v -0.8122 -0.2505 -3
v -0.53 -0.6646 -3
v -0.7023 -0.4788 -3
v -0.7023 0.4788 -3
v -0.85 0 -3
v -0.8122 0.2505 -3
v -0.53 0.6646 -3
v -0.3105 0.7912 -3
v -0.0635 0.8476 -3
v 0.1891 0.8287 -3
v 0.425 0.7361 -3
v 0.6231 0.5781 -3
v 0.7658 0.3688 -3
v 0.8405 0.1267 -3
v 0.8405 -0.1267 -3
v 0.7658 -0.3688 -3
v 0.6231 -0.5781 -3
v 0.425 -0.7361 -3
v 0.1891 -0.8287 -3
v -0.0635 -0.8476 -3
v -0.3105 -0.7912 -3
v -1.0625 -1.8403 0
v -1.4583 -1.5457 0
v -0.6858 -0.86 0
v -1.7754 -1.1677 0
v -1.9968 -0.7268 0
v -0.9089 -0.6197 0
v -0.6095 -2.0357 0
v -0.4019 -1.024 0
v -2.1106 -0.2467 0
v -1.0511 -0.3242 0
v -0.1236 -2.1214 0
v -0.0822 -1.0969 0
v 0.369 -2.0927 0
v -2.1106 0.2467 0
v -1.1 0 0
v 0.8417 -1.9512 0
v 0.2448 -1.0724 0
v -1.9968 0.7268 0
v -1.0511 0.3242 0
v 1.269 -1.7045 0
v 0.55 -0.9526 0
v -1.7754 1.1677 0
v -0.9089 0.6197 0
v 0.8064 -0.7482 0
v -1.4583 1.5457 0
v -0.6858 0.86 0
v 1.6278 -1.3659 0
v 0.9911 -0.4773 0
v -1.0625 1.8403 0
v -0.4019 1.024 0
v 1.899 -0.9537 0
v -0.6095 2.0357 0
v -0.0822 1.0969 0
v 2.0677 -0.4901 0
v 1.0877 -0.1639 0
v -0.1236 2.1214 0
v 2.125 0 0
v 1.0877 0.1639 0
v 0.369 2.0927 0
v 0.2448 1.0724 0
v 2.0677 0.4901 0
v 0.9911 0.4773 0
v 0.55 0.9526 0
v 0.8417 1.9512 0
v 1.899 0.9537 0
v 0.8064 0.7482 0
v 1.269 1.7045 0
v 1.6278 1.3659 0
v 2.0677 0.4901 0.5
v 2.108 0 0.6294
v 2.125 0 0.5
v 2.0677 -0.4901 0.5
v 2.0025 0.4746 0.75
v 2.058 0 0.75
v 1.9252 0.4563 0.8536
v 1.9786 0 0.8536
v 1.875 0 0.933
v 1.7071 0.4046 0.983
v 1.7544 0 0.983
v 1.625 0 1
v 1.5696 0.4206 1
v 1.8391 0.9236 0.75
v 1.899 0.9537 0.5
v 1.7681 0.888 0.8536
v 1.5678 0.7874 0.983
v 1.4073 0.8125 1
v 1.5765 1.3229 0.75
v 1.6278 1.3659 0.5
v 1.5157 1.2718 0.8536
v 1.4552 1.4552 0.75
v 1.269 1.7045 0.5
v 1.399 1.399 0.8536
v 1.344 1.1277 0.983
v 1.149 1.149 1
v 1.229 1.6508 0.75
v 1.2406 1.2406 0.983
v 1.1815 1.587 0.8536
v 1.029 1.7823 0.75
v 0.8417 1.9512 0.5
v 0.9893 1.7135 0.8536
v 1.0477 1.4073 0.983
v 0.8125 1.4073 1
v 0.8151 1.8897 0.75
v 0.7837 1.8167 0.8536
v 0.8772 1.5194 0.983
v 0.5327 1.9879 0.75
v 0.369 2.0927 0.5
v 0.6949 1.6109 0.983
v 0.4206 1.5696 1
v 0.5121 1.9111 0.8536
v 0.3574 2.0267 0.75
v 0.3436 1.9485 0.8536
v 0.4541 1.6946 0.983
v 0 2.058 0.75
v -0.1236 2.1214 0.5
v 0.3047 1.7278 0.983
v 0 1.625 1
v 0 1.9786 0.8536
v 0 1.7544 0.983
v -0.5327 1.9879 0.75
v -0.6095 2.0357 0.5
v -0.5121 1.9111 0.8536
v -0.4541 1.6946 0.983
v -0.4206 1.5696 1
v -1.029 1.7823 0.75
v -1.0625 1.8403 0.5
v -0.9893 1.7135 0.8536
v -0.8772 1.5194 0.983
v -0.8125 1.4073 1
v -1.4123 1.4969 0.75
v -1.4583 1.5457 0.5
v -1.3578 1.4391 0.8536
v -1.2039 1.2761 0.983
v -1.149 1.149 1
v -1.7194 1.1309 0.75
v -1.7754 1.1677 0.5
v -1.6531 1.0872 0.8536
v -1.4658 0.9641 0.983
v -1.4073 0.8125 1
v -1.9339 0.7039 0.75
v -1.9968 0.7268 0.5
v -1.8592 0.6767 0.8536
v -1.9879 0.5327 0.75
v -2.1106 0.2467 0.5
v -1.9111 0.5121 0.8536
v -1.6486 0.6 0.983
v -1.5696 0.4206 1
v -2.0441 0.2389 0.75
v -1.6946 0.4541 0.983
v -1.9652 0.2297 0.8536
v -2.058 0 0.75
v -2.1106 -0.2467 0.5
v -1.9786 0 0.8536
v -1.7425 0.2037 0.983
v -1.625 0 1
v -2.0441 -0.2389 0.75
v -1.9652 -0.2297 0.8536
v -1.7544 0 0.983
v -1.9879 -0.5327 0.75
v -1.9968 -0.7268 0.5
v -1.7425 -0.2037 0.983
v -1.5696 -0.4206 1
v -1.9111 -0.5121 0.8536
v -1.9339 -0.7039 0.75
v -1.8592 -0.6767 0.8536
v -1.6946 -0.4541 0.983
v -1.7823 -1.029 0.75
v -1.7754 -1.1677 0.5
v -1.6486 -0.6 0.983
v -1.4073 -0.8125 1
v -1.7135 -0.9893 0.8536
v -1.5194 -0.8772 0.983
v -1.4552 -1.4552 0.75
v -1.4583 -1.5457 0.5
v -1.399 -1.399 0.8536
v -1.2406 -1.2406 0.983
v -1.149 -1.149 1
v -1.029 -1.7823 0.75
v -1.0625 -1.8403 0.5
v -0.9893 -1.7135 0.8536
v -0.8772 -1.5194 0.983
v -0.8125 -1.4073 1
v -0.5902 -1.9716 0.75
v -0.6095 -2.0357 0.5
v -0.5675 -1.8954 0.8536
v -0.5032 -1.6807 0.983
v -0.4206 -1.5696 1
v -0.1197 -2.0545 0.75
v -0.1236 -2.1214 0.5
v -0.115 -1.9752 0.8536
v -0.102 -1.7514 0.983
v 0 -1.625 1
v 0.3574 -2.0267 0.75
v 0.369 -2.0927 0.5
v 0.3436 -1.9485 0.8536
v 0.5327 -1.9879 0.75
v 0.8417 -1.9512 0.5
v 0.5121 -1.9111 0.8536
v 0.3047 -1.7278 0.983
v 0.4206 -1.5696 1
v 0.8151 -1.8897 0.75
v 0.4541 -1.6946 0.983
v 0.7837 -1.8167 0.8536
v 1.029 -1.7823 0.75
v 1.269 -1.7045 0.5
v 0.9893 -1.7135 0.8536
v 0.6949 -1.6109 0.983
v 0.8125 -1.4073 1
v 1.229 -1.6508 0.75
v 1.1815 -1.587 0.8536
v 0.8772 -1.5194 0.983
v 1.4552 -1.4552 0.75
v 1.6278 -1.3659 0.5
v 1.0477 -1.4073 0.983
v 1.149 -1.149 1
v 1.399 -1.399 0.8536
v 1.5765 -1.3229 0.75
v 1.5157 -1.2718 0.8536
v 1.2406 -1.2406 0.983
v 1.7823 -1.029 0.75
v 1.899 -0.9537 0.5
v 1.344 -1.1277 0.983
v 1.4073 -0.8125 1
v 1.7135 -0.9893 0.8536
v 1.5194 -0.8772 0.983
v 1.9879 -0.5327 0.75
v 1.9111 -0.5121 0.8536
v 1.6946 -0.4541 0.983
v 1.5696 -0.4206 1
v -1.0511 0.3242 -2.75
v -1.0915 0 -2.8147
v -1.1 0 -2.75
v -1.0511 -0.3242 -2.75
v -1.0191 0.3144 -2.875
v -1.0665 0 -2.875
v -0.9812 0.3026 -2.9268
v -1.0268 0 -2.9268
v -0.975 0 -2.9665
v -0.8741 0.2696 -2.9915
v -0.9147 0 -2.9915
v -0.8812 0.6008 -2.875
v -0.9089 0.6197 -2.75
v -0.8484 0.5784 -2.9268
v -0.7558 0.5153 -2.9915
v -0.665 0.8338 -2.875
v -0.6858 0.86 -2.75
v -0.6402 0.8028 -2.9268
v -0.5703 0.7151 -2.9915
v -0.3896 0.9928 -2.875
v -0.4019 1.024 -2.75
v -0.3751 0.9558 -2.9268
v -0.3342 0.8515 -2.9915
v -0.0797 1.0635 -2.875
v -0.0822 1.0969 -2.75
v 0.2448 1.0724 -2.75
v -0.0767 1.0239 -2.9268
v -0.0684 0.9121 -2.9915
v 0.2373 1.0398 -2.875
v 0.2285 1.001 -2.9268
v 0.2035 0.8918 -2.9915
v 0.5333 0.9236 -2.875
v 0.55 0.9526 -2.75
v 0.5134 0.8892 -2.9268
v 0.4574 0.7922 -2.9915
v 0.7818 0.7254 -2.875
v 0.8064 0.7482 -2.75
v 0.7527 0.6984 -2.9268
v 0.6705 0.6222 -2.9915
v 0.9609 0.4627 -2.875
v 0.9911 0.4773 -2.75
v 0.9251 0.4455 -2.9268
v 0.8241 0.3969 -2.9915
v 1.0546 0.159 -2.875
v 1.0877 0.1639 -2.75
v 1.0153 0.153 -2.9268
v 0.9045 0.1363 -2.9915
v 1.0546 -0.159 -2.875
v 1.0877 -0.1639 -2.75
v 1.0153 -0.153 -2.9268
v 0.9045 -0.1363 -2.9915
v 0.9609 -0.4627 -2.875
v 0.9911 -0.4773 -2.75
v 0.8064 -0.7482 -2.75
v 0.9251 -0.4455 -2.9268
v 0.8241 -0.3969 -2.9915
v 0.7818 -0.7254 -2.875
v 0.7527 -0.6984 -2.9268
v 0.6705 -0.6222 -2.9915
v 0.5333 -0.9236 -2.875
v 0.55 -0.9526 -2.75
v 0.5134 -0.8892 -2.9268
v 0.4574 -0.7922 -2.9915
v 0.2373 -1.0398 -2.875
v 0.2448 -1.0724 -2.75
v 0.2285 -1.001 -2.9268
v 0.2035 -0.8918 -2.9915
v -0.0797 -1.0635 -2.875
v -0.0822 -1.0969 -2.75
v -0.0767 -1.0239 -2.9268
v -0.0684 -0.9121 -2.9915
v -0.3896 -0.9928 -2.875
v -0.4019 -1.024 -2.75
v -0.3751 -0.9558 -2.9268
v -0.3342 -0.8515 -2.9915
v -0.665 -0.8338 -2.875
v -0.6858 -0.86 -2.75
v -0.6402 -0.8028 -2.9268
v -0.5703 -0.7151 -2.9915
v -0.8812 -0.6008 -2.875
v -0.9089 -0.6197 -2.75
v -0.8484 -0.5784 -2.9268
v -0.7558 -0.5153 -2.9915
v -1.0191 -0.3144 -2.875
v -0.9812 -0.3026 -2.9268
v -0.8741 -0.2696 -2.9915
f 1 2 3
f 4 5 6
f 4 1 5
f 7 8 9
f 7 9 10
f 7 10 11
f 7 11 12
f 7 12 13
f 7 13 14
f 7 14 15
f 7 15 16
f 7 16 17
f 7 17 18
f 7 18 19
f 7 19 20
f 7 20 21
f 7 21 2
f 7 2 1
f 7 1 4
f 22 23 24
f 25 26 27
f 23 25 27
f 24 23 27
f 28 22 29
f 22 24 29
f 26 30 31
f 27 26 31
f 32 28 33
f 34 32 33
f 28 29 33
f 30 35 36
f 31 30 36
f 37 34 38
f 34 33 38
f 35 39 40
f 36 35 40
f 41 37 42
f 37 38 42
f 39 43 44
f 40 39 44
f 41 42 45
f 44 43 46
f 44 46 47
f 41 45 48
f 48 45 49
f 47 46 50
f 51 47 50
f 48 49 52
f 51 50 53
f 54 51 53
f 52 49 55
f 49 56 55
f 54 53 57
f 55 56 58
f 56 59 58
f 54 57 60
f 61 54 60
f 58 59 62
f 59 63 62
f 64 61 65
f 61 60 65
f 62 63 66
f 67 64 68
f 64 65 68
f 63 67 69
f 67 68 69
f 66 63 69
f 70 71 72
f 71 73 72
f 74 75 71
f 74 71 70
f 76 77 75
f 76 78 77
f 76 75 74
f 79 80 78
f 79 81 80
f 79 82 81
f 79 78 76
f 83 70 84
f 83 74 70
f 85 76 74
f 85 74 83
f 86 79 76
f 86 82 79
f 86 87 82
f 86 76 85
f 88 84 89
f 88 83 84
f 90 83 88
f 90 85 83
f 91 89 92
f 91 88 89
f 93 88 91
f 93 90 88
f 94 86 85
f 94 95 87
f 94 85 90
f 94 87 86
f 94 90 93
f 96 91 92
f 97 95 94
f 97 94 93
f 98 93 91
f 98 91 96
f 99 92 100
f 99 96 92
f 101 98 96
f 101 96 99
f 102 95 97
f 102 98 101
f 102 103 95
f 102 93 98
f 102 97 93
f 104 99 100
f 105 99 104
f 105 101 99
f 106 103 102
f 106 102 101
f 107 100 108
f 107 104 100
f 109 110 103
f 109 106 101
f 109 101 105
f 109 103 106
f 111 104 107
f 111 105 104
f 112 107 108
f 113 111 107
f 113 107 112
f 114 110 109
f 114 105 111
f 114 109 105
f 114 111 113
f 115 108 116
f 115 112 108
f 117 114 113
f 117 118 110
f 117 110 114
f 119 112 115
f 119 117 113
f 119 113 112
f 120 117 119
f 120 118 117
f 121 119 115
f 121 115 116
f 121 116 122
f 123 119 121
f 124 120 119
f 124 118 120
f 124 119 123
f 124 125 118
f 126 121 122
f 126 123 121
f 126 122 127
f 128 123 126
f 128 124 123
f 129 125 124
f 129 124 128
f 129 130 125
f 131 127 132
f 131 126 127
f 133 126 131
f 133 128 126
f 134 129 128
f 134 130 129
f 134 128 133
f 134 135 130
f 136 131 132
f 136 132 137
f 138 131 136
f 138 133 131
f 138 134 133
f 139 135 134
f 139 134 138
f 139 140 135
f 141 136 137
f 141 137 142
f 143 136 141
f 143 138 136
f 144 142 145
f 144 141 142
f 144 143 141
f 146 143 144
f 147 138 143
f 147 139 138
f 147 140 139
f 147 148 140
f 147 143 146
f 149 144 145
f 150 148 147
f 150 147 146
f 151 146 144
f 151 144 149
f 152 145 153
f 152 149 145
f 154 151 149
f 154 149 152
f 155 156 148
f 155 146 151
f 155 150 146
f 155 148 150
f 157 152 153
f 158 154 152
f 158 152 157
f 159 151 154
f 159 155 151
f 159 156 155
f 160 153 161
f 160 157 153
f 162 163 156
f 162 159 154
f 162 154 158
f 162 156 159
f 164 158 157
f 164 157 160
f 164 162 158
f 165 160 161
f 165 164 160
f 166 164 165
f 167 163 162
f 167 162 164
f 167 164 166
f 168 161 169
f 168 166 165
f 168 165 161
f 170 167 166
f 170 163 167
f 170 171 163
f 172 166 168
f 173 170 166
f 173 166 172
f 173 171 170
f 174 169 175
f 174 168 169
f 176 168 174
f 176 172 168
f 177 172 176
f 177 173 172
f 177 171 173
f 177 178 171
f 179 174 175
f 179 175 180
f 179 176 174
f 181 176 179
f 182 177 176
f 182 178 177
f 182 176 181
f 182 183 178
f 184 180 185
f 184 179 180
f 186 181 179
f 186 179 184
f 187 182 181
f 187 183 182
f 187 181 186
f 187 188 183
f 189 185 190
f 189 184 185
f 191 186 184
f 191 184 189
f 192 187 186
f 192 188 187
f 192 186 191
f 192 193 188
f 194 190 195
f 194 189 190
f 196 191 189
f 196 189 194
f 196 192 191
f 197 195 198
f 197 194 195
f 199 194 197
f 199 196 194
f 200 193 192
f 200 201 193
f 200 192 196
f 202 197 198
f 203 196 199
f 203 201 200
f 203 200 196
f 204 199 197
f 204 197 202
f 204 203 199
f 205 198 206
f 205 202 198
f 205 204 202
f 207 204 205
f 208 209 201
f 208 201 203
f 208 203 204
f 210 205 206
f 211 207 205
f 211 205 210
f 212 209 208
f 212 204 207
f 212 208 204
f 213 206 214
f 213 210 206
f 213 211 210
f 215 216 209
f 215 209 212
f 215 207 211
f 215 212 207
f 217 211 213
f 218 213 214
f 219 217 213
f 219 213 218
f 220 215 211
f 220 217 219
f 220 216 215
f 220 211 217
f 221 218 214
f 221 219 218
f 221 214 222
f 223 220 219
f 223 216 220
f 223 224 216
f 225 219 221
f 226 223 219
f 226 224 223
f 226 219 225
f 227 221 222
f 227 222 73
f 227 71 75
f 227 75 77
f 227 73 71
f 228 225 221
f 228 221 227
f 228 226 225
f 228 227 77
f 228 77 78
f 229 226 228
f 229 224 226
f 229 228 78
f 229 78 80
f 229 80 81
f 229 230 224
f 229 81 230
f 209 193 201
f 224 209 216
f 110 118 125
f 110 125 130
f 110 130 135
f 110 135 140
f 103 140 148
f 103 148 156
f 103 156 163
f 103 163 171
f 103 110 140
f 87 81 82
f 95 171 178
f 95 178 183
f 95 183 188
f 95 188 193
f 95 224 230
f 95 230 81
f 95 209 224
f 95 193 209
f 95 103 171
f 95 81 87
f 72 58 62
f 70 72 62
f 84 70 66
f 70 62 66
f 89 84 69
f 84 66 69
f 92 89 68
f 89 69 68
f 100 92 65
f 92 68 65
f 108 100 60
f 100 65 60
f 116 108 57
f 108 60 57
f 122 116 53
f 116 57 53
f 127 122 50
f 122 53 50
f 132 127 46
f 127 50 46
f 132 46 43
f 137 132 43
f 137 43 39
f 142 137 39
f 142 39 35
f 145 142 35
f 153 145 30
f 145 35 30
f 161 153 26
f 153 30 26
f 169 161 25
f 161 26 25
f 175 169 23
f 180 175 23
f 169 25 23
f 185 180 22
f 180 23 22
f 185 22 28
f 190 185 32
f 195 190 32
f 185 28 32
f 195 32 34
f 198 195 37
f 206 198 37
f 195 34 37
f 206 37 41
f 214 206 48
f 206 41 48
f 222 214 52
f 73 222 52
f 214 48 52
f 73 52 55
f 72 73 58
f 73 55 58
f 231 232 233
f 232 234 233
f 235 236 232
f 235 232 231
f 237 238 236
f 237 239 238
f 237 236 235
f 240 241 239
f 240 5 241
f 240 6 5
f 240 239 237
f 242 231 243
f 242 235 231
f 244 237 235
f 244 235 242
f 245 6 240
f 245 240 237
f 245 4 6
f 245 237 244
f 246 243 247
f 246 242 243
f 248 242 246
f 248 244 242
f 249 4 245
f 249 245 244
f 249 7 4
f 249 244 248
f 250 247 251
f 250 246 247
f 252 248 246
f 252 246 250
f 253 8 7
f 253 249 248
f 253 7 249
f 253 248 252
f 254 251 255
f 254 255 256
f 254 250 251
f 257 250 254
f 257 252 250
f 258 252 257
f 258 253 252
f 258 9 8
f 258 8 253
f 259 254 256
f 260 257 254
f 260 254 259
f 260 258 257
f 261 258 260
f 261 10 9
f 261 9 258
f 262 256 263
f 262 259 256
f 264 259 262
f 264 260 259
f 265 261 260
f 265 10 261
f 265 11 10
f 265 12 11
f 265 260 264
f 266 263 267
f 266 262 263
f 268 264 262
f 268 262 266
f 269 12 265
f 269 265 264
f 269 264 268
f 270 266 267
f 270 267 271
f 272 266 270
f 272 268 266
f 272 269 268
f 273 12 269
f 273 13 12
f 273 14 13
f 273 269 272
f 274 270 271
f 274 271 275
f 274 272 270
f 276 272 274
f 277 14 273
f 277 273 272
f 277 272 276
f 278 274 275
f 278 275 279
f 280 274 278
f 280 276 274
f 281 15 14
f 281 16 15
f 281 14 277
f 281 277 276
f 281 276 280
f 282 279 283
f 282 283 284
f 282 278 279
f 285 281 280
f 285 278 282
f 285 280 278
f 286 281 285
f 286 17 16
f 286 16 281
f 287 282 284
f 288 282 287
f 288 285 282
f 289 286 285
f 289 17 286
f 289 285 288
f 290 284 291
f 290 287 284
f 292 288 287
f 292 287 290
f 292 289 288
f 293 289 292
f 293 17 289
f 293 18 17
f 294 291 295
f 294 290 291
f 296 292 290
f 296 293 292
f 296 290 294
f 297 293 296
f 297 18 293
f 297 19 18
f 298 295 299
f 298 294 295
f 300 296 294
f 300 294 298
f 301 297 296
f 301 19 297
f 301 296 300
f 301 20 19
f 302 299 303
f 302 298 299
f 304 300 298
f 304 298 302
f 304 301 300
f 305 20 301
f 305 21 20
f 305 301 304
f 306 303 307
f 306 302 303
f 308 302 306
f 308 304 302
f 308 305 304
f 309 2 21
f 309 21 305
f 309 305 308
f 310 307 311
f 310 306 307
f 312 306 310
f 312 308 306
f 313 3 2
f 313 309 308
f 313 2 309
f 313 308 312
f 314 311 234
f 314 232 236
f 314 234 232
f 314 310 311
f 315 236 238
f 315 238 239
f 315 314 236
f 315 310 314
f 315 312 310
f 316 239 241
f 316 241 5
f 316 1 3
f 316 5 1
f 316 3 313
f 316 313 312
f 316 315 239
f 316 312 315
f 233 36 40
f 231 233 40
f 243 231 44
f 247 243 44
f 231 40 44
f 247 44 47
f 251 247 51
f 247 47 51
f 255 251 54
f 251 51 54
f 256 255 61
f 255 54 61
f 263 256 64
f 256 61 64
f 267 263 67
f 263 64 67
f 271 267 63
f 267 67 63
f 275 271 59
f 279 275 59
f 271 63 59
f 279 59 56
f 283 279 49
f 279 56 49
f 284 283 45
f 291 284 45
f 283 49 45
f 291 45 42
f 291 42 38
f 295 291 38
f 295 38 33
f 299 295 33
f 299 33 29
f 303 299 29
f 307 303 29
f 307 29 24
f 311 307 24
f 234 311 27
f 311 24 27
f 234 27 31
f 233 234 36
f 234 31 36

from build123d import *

# Parameters (mm, degrees)
ESQUISSE1_R        = 2.125
BOSS_EXTRU_1_DEPTH = 1
ESQUISSE2_R        = 1.1
BOSS_EXTRU_2_DEPTH = 3
CONG_2_R           = 0.5
CONG_3_R           = 0.25


with BuildPart() as part:
    # Esquisse1 → Boss.-Extru.1 (new body)
    with BuildSketch(Plane.XY):
        Circle(ESQUISSE1_R)
    extrude(amount=BOSS_EXTRU_1_DEPTH)

    # Esquisse2 → Boss.-Extru.2 (add)
    with BuildSketch(Plane(origin=(0, 0, 0), x_dir=(-1, 0, 0), z_dir=(0, 0, -1))):
        Circle(ESQUISSE2_R)
    extrude(amount=BOSS_EXTRU_2_DEPTH)

    # Congé2
    cong_2_edges = [part.edges().sort_by_distance(p)[0] for p in [
        (-2.125, 0, 1),
    ]]
    fillet(cong_2_edges, radius=CONG_2_R)

    # Congé3
    cong_3_edges = [part.edges().sort_by_distance(p)[0] for p in [
        (1.1, 0, -3),
    ]]
    fillet(cong_3_edges, radius=CONG_3_R)


solid = part.part
